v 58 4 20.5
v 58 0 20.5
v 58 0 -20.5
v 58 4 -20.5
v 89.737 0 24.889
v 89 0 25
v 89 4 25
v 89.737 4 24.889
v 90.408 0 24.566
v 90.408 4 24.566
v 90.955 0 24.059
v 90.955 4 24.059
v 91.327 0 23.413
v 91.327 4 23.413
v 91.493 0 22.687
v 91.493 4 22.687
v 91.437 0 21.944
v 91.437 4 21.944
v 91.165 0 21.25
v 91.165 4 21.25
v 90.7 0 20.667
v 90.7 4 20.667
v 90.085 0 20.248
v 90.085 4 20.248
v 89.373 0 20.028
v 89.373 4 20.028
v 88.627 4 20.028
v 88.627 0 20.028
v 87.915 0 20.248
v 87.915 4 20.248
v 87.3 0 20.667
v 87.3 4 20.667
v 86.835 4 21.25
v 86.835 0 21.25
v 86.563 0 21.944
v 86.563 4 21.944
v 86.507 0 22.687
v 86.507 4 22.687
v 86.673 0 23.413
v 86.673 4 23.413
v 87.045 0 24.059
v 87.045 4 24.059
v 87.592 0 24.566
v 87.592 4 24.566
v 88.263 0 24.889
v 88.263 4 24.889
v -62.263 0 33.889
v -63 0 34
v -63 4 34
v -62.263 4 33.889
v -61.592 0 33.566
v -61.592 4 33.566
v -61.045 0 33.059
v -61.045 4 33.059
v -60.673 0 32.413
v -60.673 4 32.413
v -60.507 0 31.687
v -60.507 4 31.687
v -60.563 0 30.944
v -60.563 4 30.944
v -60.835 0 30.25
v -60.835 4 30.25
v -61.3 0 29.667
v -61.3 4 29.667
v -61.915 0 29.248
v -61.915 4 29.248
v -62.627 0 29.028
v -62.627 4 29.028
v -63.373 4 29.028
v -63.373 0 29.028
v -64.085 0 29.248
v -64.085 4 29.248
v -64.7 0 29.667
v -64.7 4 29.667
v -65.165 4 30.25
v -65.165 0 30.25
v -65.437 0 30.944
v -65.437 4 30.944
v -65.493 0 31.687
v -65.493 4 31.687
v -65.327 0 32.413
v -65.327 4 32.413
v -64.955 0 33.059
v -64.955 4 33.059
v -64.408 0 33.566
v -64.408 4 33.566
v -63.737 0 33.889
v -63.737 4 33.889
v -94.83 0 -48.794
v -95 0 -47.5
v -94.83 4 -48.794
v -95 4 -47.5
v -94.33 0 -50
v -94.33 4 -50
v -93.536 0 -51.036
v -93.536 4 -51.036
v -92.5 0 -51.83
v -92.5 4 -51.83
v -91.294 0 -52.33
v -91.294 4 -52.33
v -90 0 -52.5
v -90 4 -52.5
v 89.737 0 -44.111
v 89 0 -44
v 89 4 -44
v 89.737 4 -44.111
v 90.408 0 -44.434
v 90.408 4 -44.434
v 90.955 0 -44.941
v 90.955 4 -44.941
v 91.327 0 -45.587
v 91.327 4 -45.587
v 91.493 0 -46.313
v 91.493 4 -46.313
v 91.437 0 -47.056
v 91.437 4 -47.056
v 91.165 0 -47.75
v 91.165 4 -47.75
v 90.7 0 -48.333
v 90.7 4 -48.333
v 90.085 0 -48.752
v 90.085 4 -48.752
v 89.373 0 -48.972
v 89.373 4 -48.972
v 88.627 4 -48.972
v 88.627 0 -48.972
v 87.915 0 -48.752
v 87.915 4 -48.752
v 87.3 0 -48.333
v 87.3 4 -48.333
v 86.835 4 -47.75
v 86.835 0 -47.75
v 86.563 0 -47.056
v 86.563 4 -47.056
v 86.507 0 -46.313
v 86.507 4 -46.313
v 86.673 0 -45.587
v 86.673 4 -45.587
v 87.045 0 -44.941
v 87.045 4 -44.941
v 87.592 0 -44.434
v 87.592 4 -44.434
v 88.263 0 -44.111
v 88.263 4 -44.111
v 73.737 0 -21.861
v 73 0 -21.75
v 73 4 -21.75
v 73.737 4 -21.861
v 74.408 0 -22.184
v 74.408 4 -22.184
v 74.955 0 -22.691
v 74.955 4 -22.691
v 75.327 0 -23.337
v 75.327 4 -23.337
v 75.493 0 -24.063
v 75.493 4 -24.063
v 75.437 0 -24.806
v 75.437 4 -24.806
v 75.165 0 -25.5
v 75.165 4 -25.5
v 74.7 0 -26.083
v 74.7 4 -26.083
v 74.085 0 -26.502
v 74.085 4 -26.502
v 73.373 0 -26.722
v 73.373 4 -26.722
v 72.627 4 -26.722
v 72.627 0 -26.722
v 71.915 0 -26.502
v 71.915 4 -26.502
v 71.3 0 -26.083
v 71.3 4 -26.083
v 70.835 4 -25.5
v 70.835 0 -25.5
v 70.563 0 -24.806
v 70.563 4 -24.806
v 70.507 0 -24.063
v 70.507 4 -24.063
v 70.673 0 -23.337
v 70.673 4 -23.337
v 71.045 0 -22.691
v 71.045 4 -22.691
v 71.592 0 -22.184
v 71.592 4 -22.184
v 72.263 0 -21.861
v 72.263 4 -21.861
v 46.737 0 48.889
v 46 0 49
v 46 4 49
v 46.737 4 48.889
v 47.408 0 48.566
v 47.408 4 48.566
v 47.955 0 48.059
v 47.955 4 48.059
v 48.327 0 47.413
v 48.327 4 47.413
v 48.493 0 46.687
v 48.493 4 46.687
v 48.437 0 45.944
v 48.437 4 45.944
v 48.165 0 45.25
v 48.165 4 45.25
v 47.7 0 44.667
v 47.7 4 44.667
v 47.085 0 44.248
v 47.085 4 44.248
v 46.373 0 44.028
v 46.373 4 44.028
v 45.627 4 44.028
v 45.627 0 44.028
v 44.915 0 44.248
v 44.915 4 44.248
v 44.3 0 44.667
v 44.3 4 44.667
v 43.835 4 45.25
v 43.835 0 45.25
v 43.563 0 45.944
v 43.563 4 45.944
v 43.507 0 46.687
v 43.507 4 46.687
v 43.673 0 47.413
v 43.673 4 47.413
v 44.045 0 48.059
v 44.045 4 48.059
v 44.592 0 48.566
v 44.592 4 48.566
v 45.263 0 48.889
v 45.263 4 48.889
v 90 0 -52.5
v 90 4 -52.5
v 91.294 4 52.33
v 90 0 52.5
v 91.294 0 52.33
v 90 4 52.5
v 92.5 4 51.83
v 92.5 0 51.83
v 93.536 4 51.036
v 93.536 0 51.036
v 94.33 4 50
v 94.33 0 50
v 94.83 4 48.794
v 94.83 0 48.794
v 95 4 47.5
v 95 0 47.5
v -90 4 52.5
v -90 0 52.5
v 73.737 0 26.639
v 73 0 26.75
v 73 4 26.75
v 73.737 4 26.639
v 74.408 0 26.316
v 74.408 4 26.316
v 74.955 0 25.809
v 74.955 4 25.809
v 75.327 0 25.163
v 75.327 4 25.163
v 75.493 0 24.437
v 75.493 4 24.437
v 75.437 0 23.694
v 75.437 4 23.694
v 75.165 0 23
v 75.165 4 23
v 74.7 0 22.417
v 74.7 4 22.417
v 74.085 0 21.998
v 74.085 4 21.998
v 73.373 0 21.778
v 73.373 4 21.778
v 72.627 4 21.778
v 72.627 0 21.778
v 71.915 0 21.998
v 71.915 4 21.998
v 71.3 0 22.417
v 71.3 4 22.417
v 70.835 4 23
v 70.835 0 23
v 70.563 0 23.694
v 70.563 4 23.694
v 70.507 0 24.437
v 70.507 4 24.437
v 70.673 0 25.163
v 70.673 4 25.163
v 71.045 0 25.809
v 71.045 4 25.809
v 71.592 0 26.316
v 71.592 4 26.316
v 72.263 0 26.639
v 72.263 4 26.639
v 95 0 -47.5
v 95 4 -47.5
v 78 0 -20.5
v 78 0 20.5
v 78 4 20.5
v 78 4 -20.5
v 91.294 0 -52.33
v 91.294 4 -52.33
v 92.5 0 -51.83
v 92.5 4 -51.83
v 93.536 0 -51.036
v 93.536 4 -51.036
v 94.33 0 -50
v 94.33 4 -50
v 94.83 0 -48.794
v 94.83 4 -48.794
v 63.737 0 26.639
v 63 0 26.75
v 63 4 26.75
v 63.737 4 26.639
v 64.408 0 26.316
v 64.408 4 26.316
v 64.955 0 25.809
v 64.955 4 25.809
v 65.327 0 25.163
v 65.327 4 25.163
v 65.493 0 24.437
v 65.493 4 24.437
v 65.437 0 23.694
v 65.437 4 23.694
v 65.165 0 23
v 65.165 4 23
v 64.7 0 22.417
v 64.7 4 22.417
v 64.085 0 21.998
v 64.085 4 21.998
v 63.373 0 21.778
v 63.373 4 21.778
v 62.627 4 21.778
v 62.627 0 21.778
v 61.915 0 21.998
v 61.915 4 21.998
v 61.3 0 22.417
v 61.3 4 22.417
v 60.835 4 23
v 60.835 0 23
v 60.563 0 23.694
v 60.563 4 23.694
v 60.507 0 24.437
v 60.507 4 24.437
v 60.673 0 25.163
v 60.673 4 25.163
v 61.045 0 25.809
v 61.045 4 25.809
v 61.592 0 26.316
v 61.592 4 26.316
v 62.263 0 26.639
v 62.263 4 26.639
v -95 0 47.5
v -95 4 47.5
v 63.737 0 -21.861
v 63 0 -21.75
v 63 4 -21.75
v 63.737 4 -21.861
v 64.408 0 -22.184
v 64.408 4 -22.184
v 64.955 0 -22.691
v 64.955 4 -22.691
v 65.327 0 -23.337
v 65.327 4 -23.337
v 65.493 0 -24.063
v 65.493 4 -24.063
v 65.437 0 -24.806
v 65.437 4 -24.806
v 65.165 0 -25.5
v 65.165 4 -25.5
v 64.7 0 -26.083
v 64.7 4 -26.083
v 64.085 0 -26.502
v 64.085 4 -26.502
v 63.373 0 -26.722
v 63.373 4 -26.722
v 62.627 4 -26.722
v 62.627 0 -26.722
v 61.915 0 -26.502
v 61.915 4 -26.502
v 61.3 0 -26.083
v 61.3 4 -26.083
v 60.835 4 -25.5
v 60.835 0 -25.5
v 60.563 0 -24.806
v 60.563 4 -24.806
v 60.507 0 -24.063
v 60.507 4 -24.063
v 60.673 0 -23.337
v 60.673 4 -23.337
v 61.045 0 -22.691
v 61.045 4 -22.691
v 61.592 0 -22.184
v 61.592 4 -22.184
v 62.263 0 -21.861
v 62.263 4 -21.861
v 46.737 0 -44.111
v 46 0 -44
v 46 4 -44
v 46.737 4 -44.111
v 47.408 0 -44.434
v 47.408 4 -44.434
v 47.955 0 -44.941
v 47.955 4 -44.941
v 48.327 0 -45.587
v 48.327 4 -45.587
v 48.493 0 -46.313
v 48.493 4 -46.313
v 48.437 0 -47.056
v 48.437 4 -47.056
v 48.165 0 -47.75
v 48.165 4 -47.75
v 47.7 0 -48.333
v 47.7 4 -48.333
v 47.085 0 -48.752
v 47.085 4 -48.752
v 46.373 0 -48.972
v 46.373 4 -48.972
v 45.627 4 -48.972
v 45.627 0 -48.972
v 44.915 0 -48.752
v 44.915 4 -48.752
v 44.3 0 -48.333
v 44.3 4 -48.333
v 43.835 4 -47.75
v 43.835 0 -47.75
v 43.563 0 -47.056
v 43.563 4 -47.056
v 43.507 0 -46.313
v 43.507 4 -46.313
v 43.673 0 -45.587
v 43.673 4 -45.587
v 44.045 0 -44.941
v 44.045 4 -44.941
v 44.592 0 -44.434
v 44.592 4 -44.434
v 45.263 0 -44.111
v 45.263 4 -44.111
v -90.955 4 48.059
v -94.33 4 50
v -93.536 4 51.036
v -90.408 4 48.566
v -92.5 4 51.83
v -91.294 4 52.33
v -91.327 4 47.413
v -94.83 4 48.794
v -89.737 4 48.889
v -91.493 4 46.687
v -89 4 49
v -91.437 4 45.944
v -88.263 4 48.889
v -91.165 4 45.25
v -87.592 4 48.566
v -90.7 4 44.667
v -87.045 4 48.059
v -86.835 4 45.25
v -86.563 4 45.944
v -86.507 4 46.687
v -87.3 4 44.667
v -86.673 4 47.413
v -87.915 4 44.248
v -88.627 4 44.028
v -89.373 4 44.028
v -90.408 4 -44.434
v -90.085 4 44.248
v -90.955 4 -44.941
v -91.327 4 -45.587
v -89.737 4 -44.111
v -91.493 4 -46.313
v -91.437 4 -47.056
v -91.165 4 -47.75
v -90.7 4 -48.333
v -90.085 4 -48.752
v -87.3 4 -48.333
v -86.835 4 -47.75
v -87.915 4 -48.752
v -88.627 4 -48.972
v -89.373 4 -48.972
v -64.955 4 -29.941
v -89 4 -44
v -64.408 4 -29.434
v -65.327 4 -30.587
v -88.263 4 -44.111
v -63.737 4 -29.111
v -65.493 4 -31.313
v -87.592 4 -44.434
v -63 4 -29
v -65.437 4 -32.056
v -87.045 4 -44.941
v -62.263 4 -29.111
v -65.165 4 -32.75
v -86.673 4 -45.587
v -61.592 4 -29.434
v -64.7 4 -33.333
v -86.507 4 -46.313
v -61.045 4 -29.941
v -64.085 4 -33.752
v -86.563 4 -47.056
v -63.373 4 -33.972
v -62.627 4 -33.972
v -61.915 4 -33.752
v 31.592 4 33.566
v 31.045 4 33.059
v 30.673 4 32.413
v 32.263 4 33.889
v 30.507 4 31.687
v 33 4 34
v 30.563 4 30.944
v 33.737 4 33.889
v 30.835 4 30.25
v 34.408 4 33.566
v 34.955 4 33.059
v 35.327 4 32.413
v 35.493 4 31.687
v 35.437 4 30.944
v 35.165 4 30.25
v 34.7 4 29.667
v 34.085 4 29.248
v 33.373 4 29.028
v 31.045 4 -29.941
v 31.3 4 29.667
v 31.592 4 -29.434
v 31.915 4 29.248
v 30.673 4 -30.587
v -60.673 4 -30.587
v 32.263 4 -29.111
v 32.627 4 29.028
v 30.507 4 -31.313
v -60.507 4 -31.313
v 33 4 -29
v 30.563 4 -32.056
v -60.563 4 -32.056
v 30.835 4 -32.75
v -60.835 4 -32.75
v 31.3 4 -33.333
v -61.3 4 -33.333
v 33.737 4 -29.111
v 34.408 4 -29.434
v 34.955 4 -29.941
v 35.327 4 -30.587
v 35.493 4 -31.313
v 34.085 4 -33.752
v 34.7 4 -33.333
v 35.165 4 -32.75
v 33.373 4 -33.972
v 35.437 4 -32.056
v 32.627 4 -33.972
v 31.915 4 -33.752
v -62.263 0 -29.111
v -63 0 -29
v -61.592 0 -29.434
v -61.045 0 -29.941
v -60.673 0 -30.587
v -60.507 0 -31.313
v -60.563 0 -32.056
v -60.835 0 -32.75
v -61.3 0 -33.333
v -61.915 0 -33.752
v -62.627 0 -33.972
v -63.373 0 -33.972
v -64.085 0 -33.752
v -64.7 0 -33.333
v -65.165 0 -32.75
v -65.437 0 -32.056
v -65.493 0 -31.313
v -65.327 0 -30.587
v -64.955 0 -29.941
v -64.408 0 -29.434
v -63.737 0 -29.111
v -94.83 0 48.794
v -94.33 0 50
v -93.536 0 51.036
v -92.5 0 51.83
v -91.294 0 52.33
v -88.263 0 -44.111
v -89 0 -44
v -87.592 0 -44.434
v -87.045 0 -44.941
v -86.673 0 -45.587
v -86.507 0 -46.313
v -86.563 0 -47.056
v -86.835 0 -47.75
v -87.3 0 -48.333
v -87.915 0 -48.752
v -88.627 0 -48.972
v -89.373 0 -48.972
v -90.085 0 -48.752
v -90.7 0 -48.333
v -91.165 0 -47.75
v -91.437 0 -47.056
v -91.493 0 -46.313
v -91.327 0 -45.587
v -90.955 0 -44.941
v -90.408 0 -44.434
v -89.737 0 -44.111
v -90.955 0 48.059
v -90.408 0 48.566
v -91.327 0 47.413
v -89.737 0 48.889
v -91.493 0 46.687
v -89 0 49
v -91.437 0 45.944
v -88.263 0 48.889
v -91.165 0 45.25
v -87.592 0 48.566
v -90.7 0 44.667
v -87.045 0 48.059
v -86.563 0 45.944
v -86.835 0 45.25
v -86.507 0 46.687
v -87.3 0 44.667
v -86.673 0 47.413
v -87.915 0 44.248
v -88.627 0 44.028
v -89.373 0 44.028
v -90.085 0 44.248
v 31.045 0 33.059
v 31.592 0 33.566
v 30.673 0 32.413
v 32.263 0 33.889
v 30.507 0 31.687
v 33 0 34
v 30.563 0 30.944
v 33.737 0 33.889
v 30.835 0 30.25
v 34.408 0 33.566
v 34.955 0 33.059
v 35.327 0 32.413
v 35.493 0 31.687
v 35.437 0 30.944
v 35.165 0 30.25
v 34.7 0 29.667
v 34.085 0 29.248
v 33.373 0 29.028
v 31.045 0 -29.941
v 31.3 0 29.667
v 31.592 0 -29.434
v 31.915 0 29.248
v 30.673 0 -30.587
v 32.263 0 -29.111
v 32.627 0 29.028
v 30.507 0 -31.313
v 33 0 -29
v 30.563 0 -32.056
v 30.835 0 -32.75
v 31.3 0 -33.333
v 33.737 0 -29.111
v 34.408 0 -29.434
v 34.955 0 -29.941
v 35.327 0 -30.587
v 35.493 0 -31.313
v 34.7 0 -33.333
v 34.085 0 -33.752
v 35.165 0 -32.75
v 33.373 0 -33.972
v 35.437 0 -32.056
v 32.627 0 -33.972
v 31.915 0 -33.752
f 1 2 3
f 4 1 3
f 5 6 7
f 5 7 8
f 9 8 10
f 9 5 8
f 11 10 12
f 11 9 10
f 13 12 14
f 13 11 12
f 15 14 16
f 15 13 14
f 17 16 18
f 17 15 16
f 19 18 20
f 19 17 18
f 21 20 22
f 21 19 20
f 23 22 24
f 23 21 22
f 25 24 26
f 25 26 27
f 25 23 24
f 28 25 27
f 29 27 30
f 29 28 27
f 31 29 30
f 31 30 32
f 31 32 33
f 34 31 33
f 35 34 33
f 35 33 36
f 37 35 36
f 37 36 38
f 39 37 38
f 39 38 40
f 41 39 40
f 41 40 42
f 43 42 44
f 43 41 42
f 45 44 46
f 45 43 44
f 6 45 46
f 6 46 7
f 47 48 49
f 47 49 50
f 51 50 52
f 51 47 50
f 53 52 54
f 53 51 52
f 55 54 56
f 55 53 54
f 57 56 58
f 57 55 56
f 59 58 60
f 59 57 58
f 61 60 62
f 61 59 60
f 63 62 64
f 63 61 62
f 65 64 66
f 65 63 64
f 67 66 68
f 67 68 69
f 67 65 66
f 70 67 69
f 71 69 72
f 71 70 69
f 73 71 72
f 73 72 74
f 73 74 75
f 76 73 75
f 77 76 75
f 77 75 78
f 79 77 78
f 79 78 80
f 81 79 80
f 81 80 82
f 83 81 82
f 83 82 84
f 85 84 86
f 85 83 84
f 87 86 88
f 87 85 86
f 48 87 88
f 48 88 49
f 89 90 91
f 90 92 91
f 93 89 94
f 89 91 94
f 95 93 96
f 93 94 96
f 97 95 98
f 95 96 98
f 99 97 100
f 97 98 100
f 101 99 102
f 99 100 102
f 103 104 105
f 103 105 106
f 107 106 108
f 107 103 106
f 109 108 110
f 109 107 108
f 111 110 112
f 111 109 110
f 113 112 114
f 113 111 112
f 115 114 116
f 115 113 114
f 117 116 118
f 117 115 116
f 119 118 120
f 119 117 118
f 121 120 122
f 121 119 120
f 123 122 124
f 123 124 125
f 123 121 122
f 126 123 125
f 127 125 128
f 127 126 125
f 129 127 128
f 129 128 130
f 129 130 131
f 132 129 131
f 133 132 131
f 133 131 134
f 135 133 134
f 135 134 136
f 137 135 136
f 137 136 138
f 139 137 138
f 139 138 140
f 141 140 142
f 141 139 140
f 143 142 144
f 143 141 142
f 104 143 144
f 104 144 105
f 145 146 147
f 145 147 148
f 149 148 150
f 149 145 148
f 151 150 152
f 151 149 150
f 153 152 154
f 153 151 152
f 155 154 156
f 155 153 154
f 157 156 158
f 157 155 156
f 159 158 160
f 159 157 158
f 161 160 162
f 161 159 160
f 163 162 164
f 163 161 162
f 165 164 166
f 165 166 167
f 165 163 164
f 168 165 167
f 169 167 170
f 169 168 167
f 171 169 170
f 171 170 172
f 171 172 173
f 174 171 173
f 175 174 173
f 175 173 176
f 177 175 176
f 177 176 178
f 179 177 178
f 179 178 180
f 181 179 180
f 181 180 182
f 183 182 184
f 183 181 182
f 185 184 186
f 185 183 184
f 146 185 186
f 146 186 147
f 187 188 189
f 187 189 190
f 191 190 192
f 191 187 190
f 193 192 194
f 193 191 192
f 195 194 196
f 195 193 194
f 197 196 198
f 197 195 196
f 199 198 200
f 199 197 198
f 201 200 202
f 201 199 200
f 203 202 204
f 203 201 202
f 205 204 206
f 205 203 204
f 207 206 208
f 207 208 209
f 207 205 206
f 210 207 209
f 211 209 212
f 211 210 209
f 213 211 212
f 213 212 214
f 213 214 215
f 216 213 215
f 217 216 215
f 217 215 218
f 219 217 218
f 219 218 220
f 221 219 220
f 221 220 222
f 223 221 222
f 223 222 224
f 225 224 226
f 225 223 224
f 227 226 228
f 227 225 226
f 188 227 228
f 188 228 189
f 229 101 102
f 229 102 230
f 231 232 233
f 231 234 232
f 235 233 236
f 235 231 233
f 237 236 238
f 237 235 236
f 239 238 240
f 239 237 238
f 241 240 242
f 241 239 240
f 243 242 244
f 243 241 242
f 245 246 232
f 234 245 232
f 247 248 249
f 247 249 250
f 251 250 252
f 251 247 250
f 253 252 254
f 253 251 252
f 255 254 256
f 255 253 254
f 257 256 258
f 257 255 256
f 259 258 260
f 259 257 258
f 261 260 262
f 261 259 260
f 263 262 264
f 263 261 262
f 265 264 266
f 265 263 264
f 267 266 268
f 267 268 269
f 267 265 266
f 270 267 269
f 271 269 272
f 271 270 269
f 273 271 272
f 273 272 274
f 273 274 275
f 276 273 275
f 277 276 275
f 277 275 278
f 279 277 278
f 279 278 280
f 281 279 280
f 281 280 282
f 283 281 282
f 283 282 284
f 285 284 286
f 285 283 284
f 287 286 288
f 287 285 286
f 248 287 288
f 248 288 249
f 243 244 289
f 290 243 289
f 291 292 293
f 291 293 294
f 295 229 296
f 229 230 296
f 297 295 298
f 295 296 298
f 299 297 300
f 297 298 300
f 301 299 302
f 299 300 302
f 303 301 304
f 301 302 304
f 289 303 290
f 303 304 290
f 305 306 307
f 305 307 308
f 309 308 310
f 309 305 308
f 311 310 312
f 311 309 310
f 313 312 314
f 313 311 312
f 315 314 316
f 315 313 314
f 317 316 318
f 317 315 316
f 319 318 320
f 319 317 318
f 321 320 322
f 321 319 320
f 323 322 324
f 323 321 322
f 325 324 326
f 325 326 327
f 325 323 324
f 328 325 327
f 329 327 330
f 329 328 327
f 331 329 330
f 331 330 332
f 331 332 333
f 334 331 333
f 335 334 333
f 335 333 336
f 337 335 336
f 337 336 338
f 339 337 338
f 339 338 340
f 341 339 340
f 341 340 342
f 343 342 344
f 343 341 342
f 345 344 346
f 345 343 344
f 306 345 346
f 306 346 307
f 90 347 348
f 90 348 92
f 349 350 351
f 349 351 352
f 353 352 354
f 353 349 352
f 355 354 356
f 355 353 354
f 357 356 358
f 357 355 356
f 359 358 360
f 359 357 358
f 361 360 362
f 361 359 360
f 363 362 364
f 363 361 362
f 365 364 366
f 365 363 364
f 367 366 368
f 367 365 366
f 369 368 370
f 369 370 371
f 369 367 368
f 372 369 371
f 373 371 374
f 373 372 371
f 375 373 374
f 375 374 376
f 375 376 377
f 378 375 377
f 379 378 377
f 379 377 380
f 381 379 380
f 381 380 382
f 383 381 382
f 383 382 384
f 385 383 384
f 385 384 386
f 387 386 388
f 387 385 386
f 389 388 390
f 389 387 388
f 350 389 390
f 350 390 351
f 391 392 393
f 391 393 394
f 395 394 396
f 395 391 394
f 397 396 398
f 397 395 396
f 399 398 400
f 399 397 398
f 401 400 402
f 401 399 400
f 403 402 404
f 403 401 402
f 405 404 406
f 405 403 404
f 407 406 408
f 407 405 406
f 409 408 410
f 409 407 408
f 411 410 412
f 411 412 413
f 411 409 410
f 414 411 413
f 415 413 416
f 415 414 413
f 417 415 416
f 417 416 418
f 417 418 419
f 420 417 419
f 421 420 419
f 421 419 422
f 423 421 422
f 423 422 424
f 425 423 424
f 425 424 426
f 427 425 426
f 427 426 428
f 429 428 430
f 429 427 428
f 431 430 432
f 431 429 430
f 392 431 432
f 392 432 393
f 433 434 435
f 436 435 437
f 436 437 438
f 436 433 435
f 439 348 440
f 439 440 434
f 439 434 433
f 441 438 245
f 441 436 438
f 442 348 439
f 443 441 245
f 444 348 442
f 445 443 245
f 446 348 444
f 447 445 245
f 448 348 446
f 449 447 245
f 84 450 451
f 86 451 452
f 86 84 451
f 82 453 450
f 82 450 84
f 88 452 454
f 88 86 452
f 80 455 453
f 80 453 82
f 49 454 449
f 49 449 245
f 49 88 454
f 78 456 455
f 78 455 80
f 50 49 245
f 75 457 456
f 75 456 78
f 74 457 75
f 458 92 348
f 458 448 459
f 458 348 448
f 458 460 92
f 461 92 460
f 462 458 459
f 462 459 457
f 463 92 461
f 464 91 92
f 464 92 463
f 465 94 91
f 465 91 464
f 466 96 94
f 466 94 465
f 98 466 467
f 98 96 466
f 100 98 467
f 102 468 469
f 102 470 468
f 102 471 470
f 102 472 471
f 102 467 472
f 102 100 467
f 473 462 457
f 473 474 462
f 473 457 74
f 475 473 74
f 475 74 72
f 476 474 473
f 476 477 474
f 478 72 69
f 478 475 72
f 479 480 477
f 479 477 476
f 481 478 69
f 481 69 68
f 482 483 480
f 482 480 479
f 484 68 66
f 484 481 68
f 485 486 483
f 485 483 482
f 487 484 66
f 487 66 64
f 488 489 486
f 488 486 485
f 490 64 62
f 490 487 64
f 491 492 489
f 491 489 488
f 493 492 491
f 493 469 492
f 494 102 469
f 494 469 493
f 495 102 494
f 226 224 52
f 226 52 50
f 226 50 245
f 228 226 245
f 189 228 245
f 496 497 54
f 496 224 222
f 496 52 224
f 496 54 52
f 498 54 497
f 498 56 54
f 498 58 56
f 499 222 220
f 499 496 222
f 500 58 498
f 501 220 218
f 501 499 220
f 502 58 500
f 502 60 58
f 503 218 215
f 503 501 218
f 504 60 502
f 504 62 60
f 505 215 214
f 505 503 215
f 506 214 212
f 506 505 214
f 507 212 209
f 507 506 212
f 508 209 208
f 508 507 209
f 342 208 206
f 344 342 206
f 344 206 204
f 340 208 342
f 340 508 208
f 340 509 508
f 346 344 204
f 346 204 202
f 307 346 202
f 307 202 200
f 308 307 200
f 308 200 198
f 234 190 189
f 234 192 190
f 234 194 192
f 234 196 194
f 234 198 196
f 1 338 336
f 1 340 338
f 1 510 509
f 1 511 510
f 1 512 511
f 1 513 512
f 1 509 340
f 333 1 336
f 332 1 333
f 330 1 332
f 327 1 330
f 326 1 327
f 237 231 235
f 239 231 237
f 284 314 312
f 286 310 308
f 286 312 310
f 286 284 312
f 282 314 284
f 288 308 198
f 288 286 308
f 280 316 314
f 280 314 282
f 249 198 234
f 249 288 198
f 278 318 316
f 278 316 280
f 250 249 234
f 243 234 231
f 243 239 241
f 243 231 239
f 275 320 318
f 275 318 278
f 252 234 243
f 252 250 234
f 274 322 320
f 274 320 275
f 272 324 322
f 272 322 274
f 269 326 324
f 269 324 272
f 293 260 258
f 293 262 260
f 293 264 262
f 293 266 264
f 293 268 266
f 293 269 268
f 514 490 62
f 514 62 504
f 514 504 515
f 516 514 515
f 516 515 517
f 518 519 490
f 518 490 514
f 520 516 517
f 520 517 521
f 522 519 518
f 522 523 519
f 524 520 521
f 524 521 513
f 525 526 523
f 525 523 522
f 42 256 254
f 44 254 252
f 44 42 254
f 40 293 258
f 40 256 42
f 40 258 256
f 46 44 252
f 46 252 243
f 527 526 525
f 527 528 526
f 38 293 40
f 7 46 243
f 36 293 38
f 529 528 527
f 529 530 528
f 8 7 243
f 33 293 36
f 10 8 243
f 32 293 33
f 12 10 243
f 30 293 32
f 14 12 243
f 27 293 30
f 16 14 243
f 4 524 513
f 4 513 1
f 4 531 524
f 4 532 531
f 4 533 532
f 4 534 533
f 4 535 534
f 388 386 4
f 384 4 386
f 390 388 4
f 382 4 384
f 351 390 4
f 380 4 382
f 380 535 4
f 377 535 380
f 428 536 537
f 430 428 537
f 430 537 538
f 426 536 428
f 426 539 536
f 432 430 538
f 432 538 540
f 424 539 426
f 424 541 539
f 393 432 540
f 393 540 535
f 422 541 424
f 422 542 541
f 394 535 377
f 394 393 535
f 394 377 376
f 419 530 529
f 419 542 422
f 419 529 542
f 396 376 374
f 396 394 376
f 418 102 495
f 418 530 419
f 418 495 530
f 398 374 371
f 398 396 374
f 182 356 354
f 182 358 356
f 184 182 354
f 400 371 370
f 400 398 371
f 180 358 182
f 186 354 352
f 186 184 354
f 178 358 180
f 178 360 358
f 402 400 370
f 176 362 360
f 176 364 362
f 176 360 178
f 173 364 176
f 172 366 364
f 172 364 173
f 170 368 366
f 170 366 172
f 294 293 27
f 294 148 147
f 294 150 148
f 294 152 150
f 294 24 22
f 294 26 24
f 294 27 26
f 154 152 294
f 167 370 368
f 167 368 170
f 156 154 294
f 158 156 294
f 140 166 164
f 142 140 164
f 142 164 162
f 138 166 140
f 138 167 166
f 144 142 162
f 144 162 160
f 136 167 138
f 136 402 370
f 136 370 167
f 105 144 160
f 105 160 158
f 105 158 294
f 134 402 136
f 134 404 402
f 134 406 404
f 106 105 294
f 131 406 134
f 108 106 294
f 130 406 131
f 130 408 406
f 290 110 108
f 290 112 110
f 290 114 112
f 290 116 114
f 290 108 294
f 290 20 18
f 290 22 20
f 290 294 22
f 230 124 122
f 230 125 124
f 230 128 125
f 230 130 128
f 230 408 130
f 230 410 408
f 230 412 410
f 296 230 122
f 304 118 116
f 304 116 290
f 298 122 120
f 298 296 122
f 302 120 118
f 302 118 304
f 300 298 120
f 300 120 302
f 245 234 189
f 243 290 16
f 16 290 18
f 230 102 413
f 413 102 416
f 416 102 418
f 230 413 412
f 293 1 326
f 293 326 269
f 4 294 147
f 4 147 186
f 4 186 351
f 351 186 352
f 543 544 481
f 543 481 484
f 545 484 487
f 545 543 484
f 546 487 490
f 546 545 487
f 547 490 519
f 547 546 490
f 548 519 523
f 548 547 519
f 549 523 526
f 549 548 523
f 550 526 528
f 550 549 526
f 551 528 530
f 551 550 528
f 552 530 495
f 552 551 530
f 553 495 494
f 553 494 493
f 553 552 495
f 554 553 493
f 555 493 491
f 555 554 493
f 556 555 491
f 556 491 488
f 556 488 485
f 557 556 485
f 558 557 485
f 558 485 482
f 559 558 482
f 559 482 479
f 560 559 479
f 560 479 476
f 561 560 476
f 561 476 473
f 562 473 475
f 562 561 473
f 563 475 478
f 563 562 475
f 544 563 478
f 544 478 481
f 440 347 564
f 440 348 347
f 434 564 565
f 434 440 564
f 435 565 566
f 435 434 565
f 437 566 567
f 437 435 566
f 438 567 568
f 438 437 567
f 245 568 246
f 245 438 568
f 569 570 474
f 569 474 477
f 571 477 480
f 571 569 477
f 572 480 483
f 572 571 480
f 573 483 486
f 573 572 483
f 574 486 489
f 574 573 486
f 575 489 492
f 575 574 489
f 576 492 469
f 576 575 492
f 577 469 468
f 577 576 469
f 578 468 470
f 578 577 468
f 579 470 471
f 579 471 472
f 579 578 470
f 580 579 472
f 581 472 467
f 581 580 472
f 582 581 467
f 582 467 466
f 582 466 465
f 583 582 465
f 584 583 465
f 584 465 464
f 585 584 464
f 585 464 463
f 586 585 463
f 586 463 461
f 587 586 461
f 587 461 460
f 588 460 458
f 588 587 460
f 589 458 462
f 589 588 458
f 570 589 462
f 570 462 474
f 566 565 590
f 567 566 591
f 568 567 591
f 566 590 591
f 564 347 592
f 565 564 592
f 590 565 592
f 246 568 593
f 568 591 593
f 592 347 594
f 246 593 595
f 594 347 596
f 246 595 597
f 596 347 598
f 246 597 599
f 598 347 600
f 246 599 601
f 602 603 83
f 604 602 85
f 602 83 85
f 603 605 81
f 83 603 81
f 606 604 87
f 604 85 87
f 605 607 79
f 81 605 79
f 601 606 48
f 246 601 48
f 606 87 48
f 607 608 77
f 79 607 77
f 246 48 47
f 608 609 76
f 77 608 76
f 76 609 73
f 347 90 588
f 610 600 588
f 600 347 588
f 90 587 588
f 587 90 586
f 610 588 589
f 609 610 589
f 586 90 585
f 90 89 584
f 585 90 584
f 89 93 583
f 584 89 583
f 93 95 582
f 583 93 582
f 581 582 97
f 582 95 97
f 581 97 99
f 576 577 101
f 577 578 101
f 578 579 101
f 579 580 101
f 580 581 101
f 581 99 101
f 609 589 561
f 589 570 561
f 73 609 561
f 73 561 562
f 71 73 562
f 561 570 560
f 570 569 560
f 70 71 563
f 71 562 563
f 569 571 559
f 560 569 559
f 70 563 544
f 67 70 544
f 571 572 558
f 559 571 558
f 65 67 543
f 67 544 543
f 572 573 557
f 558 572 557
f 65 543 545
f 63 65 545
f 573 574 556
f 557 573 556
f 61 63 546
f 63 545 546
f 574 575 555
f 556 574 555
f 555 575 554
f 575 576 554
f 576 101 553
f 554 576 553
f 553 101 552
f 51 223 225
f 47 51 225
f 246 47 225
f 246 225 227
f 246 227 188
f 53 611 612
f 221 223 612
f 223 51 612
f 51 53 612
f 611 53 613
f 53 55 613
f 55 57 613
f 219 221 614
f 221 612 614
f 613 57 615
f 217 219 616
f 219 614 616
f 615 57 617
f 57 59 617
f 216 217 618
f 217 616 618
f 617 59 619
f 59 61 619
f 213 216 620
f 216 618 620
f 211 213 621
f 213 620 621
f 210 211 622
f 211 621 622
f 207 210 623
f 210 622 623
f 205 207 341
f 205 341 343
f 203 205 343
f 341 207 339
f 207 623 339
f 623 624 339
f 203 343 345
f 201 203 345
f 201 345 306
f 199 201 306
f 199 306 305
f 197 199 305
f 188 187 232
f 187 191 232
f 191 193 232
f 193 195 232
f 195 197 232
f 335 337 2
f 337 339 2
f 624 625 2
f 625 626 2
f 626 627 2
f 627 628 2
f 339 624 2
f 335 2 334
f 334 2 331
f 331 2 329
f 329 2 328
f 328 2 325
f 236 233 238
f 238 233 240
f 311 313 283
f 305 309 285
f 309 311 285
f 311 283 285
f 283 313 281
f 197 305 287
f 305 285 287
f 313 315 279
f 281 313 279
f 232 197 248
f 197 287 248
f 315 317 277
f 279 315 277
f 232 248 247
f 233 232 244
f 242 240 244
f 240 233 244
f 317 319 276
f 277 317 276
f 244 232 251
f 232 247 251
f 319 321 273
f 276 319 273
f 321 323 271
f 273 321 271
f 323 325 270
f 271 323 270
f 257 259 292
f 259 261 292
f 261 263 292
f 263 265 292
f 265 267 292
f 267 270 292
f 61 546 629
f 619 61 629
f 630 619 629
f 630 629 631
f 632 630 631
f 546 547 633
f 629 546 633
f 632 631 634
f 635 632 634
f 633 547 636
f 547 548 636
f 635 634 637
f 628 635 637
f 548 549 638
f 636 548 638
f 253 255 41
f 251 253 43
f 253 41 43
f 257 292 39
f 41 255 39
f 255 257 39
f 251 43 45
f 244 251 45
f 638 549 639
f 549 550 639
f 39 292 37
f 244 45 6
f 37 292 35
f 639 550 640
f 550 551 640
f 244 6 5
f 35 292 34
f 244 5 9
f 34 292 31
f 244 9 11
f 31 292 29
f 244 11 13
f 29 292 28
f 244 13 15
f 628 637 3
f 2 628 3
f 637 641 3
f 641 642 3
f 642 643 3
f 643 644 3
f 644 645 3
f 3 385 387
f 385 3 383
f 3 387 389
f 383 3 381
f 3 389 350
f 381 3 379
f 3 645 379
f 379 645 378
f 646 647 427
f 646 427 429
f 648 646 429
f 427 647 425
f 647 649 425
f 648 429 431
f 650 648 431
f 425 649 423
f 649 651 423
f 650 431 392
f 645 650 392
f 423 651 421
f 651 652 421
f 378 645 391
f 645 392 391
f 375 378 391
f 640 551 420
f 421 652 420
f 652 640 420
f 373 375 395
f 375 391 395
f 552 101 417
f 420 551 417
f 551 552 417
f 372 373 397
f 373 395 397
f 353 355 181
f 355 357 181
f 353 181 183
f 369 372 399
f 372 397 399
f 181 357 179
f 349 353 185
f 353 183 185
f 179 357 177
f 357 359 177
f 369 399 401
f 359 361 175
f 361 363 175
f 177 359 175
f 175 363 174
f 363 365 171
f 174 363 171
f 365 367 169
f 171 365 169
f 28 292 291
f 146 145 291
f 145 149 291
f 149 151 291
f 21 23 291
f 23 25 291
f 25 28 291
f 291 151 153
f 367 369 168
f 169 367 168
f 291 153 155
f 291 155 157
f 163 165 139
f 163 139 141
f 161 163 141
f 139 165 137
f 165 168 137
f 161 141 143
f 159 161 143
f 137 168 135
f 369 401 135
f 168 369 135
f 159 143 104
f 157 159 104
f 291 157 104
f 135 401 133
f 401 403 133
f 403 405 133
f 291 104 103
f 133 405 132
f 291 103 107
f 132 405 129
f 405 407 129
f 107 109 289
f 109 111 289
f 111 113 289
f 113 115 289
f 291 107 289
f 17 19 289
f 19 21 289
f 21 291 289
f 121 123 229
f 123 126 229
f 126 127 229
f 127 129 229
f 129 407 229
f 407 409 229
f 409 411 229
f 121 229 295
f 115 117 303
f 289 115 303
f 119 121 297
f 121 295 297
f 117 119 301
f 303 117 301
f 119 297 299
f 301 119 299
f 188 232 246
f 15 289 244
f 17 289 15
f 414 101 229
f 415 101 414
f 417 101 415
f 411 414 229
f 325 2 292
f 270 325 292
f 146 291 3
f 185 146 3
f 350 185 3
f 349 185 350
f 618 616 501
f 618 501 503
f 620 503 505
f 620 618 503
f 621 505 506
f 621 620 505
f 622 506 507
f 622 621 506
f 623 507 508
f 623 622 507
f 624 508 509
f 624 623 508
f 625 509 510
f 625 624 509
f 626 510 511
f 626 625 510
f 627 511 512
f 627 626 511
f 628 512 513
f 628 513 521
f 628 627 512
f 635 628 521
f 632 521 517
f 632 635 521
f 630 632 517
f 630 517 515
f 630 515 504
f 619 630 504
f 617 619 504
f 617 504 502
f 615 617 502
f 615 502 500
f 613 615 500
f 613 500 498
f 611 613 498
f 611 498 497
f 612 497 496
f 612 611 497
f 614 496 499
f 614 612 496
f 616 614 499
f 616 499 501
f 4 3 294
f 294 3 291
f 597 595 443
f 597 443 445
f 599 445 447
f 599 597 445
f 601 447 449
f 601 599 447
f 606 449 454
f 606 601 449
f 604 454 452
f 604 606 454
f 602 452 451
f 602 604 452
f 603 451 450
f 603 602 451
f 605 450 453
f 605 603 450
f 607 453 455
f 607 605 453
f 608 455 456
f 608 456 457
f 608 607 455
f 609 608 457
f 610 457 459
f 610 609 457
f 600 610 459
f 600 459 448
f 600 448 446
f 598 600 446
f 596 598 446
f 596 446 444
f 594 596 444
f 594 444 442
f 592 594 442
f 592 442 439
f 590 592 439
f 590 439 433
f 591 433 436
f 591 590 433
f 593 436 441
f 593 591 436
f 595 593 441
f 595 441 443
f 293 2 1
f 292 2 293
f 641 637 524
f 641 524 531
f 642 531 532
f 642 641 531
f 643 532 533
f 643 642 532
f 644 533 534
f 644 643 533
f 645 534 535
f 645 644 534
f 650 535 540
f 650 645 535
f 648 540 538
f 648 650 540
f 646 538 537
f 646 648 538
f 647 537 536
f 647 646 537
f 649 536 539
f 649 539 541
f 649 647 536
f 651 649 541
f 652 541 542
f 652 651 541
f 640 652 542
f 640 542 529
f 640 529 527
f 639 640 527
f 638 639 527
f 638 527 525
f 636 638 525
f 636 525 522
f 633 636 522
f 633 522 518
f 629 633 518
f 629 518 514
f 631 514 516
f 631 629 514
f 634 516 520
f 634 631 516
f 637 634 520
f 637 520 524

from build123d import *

# Parameters (mm, degrees)
SKETCH_1_W      = 190
SKETCH_1_H      = 105
SKETCH_1_R      = 2.5
SKETCH_1_W_2    = 20
SKETCH_1_H_2    = 41
EXTRUDE_1_DEPTH = 4
FILLET_1_R      = 5


with BuildPart() as part:
    # 草图1 → 凸台-拉伸1 (new body)
    with BuildSketch(Plane(origin=(0, 0, 0), x_dir=(1, 0, 0), z_dir=(0, 1, 0))):
        Rectangle(SKETCH_1_W, SKETCH_1_H)
        with Locations(Location((-89, 46.5, 0), (0, 0, 270))):
            Circle(SKETCH_1_R, mode=Mode.SUBTRACT)
        with Locations(Location((89, 46.5, 0), (0, 0, 270))):
            Circle(SKETCH_1_R, mode=Mode.SUBTRACT)
        with Locations(Location((-89, -46.5, 0), (0, 0, 270))):
            Circle(SKETCH_1_R, mode=Mode.SUBTRACT)
        with Locations(Location((-63, 31.5, 0), (0, 0, 270))):
            Circle(SKETCH_1_R, mode=Mode.SUBTRACT)
        with Locations(Location((33, 31.5, 0), (0, 0, 270))):
            Circle(SKETCH_1_R, mode=Mode.SUBTRACT)
        with Locations(Location((-63, -31.5, 0), (0, 0, 270))):
            Circle(SKETCH_1_R, mode=Mode.SUBTRACT)
        with Locations(Location((33, -31.5, 0), (0, 0, 270))):
            Circle(SKETCH_1_R, mode=Mode.SUBTRACT)
        with Locations(Location((63, 24.25, 0), (0, 0, 270))):
            Circle(SKETCH_1_R, mode=Mode.SUBTRACT)
        with Locations(Location((73, 24.25, 0), (0, 0, 270))):
            Circle(SKETCH_1_R, mode=Mode.SUBTRACT)
        with Locations(Location((63, -24.25, 0), (0, 0, 270))):
            Circle(SKETCH_1_R, mode=Mode.SUBTRACT)
        with Locations(Location((73, -24.25, 0), (0, 0, 270))):
            Circle(SKETCH_1_R, mode=Mode.SUBTRACT)
        with Locations(Location((46, -46.5, 0), (0, 0, 270))):
            Circle(SKETCH_1_R, mode=Mode.SUBTRACT)
        with Locations(Location((46, 46.5, 0), (0, 0, 270))):
            Circle(SKETCH_1_R, mode=Mode.SUBTRACT)
        with Locations(Location((89, -22.5, 0), (0, 0, 270))):
            Circle(SKETCH_1_R, mode=Mode.SUBTRACT)
        with Locations((68, 0)):
            Rectangle(SKETCH_1_W_2, SKETCH_1_H_2, mode=Mode.SUBTRACT)
    extrude(amount=EXTRUDE_1_DEPTH)

    # 圆角1
    fillet_1_edges = [part.edges().sort_by_distance(p)[0] for p in [
        (95, 2, 52.5),
        (-95, 2, 52.5),
        (-95, 2, -52.5),
        (95, 2, -52.5),
    ]]
    fillet(fillet_1_edges, radius=FILLET_1_R)


solid = part.part
